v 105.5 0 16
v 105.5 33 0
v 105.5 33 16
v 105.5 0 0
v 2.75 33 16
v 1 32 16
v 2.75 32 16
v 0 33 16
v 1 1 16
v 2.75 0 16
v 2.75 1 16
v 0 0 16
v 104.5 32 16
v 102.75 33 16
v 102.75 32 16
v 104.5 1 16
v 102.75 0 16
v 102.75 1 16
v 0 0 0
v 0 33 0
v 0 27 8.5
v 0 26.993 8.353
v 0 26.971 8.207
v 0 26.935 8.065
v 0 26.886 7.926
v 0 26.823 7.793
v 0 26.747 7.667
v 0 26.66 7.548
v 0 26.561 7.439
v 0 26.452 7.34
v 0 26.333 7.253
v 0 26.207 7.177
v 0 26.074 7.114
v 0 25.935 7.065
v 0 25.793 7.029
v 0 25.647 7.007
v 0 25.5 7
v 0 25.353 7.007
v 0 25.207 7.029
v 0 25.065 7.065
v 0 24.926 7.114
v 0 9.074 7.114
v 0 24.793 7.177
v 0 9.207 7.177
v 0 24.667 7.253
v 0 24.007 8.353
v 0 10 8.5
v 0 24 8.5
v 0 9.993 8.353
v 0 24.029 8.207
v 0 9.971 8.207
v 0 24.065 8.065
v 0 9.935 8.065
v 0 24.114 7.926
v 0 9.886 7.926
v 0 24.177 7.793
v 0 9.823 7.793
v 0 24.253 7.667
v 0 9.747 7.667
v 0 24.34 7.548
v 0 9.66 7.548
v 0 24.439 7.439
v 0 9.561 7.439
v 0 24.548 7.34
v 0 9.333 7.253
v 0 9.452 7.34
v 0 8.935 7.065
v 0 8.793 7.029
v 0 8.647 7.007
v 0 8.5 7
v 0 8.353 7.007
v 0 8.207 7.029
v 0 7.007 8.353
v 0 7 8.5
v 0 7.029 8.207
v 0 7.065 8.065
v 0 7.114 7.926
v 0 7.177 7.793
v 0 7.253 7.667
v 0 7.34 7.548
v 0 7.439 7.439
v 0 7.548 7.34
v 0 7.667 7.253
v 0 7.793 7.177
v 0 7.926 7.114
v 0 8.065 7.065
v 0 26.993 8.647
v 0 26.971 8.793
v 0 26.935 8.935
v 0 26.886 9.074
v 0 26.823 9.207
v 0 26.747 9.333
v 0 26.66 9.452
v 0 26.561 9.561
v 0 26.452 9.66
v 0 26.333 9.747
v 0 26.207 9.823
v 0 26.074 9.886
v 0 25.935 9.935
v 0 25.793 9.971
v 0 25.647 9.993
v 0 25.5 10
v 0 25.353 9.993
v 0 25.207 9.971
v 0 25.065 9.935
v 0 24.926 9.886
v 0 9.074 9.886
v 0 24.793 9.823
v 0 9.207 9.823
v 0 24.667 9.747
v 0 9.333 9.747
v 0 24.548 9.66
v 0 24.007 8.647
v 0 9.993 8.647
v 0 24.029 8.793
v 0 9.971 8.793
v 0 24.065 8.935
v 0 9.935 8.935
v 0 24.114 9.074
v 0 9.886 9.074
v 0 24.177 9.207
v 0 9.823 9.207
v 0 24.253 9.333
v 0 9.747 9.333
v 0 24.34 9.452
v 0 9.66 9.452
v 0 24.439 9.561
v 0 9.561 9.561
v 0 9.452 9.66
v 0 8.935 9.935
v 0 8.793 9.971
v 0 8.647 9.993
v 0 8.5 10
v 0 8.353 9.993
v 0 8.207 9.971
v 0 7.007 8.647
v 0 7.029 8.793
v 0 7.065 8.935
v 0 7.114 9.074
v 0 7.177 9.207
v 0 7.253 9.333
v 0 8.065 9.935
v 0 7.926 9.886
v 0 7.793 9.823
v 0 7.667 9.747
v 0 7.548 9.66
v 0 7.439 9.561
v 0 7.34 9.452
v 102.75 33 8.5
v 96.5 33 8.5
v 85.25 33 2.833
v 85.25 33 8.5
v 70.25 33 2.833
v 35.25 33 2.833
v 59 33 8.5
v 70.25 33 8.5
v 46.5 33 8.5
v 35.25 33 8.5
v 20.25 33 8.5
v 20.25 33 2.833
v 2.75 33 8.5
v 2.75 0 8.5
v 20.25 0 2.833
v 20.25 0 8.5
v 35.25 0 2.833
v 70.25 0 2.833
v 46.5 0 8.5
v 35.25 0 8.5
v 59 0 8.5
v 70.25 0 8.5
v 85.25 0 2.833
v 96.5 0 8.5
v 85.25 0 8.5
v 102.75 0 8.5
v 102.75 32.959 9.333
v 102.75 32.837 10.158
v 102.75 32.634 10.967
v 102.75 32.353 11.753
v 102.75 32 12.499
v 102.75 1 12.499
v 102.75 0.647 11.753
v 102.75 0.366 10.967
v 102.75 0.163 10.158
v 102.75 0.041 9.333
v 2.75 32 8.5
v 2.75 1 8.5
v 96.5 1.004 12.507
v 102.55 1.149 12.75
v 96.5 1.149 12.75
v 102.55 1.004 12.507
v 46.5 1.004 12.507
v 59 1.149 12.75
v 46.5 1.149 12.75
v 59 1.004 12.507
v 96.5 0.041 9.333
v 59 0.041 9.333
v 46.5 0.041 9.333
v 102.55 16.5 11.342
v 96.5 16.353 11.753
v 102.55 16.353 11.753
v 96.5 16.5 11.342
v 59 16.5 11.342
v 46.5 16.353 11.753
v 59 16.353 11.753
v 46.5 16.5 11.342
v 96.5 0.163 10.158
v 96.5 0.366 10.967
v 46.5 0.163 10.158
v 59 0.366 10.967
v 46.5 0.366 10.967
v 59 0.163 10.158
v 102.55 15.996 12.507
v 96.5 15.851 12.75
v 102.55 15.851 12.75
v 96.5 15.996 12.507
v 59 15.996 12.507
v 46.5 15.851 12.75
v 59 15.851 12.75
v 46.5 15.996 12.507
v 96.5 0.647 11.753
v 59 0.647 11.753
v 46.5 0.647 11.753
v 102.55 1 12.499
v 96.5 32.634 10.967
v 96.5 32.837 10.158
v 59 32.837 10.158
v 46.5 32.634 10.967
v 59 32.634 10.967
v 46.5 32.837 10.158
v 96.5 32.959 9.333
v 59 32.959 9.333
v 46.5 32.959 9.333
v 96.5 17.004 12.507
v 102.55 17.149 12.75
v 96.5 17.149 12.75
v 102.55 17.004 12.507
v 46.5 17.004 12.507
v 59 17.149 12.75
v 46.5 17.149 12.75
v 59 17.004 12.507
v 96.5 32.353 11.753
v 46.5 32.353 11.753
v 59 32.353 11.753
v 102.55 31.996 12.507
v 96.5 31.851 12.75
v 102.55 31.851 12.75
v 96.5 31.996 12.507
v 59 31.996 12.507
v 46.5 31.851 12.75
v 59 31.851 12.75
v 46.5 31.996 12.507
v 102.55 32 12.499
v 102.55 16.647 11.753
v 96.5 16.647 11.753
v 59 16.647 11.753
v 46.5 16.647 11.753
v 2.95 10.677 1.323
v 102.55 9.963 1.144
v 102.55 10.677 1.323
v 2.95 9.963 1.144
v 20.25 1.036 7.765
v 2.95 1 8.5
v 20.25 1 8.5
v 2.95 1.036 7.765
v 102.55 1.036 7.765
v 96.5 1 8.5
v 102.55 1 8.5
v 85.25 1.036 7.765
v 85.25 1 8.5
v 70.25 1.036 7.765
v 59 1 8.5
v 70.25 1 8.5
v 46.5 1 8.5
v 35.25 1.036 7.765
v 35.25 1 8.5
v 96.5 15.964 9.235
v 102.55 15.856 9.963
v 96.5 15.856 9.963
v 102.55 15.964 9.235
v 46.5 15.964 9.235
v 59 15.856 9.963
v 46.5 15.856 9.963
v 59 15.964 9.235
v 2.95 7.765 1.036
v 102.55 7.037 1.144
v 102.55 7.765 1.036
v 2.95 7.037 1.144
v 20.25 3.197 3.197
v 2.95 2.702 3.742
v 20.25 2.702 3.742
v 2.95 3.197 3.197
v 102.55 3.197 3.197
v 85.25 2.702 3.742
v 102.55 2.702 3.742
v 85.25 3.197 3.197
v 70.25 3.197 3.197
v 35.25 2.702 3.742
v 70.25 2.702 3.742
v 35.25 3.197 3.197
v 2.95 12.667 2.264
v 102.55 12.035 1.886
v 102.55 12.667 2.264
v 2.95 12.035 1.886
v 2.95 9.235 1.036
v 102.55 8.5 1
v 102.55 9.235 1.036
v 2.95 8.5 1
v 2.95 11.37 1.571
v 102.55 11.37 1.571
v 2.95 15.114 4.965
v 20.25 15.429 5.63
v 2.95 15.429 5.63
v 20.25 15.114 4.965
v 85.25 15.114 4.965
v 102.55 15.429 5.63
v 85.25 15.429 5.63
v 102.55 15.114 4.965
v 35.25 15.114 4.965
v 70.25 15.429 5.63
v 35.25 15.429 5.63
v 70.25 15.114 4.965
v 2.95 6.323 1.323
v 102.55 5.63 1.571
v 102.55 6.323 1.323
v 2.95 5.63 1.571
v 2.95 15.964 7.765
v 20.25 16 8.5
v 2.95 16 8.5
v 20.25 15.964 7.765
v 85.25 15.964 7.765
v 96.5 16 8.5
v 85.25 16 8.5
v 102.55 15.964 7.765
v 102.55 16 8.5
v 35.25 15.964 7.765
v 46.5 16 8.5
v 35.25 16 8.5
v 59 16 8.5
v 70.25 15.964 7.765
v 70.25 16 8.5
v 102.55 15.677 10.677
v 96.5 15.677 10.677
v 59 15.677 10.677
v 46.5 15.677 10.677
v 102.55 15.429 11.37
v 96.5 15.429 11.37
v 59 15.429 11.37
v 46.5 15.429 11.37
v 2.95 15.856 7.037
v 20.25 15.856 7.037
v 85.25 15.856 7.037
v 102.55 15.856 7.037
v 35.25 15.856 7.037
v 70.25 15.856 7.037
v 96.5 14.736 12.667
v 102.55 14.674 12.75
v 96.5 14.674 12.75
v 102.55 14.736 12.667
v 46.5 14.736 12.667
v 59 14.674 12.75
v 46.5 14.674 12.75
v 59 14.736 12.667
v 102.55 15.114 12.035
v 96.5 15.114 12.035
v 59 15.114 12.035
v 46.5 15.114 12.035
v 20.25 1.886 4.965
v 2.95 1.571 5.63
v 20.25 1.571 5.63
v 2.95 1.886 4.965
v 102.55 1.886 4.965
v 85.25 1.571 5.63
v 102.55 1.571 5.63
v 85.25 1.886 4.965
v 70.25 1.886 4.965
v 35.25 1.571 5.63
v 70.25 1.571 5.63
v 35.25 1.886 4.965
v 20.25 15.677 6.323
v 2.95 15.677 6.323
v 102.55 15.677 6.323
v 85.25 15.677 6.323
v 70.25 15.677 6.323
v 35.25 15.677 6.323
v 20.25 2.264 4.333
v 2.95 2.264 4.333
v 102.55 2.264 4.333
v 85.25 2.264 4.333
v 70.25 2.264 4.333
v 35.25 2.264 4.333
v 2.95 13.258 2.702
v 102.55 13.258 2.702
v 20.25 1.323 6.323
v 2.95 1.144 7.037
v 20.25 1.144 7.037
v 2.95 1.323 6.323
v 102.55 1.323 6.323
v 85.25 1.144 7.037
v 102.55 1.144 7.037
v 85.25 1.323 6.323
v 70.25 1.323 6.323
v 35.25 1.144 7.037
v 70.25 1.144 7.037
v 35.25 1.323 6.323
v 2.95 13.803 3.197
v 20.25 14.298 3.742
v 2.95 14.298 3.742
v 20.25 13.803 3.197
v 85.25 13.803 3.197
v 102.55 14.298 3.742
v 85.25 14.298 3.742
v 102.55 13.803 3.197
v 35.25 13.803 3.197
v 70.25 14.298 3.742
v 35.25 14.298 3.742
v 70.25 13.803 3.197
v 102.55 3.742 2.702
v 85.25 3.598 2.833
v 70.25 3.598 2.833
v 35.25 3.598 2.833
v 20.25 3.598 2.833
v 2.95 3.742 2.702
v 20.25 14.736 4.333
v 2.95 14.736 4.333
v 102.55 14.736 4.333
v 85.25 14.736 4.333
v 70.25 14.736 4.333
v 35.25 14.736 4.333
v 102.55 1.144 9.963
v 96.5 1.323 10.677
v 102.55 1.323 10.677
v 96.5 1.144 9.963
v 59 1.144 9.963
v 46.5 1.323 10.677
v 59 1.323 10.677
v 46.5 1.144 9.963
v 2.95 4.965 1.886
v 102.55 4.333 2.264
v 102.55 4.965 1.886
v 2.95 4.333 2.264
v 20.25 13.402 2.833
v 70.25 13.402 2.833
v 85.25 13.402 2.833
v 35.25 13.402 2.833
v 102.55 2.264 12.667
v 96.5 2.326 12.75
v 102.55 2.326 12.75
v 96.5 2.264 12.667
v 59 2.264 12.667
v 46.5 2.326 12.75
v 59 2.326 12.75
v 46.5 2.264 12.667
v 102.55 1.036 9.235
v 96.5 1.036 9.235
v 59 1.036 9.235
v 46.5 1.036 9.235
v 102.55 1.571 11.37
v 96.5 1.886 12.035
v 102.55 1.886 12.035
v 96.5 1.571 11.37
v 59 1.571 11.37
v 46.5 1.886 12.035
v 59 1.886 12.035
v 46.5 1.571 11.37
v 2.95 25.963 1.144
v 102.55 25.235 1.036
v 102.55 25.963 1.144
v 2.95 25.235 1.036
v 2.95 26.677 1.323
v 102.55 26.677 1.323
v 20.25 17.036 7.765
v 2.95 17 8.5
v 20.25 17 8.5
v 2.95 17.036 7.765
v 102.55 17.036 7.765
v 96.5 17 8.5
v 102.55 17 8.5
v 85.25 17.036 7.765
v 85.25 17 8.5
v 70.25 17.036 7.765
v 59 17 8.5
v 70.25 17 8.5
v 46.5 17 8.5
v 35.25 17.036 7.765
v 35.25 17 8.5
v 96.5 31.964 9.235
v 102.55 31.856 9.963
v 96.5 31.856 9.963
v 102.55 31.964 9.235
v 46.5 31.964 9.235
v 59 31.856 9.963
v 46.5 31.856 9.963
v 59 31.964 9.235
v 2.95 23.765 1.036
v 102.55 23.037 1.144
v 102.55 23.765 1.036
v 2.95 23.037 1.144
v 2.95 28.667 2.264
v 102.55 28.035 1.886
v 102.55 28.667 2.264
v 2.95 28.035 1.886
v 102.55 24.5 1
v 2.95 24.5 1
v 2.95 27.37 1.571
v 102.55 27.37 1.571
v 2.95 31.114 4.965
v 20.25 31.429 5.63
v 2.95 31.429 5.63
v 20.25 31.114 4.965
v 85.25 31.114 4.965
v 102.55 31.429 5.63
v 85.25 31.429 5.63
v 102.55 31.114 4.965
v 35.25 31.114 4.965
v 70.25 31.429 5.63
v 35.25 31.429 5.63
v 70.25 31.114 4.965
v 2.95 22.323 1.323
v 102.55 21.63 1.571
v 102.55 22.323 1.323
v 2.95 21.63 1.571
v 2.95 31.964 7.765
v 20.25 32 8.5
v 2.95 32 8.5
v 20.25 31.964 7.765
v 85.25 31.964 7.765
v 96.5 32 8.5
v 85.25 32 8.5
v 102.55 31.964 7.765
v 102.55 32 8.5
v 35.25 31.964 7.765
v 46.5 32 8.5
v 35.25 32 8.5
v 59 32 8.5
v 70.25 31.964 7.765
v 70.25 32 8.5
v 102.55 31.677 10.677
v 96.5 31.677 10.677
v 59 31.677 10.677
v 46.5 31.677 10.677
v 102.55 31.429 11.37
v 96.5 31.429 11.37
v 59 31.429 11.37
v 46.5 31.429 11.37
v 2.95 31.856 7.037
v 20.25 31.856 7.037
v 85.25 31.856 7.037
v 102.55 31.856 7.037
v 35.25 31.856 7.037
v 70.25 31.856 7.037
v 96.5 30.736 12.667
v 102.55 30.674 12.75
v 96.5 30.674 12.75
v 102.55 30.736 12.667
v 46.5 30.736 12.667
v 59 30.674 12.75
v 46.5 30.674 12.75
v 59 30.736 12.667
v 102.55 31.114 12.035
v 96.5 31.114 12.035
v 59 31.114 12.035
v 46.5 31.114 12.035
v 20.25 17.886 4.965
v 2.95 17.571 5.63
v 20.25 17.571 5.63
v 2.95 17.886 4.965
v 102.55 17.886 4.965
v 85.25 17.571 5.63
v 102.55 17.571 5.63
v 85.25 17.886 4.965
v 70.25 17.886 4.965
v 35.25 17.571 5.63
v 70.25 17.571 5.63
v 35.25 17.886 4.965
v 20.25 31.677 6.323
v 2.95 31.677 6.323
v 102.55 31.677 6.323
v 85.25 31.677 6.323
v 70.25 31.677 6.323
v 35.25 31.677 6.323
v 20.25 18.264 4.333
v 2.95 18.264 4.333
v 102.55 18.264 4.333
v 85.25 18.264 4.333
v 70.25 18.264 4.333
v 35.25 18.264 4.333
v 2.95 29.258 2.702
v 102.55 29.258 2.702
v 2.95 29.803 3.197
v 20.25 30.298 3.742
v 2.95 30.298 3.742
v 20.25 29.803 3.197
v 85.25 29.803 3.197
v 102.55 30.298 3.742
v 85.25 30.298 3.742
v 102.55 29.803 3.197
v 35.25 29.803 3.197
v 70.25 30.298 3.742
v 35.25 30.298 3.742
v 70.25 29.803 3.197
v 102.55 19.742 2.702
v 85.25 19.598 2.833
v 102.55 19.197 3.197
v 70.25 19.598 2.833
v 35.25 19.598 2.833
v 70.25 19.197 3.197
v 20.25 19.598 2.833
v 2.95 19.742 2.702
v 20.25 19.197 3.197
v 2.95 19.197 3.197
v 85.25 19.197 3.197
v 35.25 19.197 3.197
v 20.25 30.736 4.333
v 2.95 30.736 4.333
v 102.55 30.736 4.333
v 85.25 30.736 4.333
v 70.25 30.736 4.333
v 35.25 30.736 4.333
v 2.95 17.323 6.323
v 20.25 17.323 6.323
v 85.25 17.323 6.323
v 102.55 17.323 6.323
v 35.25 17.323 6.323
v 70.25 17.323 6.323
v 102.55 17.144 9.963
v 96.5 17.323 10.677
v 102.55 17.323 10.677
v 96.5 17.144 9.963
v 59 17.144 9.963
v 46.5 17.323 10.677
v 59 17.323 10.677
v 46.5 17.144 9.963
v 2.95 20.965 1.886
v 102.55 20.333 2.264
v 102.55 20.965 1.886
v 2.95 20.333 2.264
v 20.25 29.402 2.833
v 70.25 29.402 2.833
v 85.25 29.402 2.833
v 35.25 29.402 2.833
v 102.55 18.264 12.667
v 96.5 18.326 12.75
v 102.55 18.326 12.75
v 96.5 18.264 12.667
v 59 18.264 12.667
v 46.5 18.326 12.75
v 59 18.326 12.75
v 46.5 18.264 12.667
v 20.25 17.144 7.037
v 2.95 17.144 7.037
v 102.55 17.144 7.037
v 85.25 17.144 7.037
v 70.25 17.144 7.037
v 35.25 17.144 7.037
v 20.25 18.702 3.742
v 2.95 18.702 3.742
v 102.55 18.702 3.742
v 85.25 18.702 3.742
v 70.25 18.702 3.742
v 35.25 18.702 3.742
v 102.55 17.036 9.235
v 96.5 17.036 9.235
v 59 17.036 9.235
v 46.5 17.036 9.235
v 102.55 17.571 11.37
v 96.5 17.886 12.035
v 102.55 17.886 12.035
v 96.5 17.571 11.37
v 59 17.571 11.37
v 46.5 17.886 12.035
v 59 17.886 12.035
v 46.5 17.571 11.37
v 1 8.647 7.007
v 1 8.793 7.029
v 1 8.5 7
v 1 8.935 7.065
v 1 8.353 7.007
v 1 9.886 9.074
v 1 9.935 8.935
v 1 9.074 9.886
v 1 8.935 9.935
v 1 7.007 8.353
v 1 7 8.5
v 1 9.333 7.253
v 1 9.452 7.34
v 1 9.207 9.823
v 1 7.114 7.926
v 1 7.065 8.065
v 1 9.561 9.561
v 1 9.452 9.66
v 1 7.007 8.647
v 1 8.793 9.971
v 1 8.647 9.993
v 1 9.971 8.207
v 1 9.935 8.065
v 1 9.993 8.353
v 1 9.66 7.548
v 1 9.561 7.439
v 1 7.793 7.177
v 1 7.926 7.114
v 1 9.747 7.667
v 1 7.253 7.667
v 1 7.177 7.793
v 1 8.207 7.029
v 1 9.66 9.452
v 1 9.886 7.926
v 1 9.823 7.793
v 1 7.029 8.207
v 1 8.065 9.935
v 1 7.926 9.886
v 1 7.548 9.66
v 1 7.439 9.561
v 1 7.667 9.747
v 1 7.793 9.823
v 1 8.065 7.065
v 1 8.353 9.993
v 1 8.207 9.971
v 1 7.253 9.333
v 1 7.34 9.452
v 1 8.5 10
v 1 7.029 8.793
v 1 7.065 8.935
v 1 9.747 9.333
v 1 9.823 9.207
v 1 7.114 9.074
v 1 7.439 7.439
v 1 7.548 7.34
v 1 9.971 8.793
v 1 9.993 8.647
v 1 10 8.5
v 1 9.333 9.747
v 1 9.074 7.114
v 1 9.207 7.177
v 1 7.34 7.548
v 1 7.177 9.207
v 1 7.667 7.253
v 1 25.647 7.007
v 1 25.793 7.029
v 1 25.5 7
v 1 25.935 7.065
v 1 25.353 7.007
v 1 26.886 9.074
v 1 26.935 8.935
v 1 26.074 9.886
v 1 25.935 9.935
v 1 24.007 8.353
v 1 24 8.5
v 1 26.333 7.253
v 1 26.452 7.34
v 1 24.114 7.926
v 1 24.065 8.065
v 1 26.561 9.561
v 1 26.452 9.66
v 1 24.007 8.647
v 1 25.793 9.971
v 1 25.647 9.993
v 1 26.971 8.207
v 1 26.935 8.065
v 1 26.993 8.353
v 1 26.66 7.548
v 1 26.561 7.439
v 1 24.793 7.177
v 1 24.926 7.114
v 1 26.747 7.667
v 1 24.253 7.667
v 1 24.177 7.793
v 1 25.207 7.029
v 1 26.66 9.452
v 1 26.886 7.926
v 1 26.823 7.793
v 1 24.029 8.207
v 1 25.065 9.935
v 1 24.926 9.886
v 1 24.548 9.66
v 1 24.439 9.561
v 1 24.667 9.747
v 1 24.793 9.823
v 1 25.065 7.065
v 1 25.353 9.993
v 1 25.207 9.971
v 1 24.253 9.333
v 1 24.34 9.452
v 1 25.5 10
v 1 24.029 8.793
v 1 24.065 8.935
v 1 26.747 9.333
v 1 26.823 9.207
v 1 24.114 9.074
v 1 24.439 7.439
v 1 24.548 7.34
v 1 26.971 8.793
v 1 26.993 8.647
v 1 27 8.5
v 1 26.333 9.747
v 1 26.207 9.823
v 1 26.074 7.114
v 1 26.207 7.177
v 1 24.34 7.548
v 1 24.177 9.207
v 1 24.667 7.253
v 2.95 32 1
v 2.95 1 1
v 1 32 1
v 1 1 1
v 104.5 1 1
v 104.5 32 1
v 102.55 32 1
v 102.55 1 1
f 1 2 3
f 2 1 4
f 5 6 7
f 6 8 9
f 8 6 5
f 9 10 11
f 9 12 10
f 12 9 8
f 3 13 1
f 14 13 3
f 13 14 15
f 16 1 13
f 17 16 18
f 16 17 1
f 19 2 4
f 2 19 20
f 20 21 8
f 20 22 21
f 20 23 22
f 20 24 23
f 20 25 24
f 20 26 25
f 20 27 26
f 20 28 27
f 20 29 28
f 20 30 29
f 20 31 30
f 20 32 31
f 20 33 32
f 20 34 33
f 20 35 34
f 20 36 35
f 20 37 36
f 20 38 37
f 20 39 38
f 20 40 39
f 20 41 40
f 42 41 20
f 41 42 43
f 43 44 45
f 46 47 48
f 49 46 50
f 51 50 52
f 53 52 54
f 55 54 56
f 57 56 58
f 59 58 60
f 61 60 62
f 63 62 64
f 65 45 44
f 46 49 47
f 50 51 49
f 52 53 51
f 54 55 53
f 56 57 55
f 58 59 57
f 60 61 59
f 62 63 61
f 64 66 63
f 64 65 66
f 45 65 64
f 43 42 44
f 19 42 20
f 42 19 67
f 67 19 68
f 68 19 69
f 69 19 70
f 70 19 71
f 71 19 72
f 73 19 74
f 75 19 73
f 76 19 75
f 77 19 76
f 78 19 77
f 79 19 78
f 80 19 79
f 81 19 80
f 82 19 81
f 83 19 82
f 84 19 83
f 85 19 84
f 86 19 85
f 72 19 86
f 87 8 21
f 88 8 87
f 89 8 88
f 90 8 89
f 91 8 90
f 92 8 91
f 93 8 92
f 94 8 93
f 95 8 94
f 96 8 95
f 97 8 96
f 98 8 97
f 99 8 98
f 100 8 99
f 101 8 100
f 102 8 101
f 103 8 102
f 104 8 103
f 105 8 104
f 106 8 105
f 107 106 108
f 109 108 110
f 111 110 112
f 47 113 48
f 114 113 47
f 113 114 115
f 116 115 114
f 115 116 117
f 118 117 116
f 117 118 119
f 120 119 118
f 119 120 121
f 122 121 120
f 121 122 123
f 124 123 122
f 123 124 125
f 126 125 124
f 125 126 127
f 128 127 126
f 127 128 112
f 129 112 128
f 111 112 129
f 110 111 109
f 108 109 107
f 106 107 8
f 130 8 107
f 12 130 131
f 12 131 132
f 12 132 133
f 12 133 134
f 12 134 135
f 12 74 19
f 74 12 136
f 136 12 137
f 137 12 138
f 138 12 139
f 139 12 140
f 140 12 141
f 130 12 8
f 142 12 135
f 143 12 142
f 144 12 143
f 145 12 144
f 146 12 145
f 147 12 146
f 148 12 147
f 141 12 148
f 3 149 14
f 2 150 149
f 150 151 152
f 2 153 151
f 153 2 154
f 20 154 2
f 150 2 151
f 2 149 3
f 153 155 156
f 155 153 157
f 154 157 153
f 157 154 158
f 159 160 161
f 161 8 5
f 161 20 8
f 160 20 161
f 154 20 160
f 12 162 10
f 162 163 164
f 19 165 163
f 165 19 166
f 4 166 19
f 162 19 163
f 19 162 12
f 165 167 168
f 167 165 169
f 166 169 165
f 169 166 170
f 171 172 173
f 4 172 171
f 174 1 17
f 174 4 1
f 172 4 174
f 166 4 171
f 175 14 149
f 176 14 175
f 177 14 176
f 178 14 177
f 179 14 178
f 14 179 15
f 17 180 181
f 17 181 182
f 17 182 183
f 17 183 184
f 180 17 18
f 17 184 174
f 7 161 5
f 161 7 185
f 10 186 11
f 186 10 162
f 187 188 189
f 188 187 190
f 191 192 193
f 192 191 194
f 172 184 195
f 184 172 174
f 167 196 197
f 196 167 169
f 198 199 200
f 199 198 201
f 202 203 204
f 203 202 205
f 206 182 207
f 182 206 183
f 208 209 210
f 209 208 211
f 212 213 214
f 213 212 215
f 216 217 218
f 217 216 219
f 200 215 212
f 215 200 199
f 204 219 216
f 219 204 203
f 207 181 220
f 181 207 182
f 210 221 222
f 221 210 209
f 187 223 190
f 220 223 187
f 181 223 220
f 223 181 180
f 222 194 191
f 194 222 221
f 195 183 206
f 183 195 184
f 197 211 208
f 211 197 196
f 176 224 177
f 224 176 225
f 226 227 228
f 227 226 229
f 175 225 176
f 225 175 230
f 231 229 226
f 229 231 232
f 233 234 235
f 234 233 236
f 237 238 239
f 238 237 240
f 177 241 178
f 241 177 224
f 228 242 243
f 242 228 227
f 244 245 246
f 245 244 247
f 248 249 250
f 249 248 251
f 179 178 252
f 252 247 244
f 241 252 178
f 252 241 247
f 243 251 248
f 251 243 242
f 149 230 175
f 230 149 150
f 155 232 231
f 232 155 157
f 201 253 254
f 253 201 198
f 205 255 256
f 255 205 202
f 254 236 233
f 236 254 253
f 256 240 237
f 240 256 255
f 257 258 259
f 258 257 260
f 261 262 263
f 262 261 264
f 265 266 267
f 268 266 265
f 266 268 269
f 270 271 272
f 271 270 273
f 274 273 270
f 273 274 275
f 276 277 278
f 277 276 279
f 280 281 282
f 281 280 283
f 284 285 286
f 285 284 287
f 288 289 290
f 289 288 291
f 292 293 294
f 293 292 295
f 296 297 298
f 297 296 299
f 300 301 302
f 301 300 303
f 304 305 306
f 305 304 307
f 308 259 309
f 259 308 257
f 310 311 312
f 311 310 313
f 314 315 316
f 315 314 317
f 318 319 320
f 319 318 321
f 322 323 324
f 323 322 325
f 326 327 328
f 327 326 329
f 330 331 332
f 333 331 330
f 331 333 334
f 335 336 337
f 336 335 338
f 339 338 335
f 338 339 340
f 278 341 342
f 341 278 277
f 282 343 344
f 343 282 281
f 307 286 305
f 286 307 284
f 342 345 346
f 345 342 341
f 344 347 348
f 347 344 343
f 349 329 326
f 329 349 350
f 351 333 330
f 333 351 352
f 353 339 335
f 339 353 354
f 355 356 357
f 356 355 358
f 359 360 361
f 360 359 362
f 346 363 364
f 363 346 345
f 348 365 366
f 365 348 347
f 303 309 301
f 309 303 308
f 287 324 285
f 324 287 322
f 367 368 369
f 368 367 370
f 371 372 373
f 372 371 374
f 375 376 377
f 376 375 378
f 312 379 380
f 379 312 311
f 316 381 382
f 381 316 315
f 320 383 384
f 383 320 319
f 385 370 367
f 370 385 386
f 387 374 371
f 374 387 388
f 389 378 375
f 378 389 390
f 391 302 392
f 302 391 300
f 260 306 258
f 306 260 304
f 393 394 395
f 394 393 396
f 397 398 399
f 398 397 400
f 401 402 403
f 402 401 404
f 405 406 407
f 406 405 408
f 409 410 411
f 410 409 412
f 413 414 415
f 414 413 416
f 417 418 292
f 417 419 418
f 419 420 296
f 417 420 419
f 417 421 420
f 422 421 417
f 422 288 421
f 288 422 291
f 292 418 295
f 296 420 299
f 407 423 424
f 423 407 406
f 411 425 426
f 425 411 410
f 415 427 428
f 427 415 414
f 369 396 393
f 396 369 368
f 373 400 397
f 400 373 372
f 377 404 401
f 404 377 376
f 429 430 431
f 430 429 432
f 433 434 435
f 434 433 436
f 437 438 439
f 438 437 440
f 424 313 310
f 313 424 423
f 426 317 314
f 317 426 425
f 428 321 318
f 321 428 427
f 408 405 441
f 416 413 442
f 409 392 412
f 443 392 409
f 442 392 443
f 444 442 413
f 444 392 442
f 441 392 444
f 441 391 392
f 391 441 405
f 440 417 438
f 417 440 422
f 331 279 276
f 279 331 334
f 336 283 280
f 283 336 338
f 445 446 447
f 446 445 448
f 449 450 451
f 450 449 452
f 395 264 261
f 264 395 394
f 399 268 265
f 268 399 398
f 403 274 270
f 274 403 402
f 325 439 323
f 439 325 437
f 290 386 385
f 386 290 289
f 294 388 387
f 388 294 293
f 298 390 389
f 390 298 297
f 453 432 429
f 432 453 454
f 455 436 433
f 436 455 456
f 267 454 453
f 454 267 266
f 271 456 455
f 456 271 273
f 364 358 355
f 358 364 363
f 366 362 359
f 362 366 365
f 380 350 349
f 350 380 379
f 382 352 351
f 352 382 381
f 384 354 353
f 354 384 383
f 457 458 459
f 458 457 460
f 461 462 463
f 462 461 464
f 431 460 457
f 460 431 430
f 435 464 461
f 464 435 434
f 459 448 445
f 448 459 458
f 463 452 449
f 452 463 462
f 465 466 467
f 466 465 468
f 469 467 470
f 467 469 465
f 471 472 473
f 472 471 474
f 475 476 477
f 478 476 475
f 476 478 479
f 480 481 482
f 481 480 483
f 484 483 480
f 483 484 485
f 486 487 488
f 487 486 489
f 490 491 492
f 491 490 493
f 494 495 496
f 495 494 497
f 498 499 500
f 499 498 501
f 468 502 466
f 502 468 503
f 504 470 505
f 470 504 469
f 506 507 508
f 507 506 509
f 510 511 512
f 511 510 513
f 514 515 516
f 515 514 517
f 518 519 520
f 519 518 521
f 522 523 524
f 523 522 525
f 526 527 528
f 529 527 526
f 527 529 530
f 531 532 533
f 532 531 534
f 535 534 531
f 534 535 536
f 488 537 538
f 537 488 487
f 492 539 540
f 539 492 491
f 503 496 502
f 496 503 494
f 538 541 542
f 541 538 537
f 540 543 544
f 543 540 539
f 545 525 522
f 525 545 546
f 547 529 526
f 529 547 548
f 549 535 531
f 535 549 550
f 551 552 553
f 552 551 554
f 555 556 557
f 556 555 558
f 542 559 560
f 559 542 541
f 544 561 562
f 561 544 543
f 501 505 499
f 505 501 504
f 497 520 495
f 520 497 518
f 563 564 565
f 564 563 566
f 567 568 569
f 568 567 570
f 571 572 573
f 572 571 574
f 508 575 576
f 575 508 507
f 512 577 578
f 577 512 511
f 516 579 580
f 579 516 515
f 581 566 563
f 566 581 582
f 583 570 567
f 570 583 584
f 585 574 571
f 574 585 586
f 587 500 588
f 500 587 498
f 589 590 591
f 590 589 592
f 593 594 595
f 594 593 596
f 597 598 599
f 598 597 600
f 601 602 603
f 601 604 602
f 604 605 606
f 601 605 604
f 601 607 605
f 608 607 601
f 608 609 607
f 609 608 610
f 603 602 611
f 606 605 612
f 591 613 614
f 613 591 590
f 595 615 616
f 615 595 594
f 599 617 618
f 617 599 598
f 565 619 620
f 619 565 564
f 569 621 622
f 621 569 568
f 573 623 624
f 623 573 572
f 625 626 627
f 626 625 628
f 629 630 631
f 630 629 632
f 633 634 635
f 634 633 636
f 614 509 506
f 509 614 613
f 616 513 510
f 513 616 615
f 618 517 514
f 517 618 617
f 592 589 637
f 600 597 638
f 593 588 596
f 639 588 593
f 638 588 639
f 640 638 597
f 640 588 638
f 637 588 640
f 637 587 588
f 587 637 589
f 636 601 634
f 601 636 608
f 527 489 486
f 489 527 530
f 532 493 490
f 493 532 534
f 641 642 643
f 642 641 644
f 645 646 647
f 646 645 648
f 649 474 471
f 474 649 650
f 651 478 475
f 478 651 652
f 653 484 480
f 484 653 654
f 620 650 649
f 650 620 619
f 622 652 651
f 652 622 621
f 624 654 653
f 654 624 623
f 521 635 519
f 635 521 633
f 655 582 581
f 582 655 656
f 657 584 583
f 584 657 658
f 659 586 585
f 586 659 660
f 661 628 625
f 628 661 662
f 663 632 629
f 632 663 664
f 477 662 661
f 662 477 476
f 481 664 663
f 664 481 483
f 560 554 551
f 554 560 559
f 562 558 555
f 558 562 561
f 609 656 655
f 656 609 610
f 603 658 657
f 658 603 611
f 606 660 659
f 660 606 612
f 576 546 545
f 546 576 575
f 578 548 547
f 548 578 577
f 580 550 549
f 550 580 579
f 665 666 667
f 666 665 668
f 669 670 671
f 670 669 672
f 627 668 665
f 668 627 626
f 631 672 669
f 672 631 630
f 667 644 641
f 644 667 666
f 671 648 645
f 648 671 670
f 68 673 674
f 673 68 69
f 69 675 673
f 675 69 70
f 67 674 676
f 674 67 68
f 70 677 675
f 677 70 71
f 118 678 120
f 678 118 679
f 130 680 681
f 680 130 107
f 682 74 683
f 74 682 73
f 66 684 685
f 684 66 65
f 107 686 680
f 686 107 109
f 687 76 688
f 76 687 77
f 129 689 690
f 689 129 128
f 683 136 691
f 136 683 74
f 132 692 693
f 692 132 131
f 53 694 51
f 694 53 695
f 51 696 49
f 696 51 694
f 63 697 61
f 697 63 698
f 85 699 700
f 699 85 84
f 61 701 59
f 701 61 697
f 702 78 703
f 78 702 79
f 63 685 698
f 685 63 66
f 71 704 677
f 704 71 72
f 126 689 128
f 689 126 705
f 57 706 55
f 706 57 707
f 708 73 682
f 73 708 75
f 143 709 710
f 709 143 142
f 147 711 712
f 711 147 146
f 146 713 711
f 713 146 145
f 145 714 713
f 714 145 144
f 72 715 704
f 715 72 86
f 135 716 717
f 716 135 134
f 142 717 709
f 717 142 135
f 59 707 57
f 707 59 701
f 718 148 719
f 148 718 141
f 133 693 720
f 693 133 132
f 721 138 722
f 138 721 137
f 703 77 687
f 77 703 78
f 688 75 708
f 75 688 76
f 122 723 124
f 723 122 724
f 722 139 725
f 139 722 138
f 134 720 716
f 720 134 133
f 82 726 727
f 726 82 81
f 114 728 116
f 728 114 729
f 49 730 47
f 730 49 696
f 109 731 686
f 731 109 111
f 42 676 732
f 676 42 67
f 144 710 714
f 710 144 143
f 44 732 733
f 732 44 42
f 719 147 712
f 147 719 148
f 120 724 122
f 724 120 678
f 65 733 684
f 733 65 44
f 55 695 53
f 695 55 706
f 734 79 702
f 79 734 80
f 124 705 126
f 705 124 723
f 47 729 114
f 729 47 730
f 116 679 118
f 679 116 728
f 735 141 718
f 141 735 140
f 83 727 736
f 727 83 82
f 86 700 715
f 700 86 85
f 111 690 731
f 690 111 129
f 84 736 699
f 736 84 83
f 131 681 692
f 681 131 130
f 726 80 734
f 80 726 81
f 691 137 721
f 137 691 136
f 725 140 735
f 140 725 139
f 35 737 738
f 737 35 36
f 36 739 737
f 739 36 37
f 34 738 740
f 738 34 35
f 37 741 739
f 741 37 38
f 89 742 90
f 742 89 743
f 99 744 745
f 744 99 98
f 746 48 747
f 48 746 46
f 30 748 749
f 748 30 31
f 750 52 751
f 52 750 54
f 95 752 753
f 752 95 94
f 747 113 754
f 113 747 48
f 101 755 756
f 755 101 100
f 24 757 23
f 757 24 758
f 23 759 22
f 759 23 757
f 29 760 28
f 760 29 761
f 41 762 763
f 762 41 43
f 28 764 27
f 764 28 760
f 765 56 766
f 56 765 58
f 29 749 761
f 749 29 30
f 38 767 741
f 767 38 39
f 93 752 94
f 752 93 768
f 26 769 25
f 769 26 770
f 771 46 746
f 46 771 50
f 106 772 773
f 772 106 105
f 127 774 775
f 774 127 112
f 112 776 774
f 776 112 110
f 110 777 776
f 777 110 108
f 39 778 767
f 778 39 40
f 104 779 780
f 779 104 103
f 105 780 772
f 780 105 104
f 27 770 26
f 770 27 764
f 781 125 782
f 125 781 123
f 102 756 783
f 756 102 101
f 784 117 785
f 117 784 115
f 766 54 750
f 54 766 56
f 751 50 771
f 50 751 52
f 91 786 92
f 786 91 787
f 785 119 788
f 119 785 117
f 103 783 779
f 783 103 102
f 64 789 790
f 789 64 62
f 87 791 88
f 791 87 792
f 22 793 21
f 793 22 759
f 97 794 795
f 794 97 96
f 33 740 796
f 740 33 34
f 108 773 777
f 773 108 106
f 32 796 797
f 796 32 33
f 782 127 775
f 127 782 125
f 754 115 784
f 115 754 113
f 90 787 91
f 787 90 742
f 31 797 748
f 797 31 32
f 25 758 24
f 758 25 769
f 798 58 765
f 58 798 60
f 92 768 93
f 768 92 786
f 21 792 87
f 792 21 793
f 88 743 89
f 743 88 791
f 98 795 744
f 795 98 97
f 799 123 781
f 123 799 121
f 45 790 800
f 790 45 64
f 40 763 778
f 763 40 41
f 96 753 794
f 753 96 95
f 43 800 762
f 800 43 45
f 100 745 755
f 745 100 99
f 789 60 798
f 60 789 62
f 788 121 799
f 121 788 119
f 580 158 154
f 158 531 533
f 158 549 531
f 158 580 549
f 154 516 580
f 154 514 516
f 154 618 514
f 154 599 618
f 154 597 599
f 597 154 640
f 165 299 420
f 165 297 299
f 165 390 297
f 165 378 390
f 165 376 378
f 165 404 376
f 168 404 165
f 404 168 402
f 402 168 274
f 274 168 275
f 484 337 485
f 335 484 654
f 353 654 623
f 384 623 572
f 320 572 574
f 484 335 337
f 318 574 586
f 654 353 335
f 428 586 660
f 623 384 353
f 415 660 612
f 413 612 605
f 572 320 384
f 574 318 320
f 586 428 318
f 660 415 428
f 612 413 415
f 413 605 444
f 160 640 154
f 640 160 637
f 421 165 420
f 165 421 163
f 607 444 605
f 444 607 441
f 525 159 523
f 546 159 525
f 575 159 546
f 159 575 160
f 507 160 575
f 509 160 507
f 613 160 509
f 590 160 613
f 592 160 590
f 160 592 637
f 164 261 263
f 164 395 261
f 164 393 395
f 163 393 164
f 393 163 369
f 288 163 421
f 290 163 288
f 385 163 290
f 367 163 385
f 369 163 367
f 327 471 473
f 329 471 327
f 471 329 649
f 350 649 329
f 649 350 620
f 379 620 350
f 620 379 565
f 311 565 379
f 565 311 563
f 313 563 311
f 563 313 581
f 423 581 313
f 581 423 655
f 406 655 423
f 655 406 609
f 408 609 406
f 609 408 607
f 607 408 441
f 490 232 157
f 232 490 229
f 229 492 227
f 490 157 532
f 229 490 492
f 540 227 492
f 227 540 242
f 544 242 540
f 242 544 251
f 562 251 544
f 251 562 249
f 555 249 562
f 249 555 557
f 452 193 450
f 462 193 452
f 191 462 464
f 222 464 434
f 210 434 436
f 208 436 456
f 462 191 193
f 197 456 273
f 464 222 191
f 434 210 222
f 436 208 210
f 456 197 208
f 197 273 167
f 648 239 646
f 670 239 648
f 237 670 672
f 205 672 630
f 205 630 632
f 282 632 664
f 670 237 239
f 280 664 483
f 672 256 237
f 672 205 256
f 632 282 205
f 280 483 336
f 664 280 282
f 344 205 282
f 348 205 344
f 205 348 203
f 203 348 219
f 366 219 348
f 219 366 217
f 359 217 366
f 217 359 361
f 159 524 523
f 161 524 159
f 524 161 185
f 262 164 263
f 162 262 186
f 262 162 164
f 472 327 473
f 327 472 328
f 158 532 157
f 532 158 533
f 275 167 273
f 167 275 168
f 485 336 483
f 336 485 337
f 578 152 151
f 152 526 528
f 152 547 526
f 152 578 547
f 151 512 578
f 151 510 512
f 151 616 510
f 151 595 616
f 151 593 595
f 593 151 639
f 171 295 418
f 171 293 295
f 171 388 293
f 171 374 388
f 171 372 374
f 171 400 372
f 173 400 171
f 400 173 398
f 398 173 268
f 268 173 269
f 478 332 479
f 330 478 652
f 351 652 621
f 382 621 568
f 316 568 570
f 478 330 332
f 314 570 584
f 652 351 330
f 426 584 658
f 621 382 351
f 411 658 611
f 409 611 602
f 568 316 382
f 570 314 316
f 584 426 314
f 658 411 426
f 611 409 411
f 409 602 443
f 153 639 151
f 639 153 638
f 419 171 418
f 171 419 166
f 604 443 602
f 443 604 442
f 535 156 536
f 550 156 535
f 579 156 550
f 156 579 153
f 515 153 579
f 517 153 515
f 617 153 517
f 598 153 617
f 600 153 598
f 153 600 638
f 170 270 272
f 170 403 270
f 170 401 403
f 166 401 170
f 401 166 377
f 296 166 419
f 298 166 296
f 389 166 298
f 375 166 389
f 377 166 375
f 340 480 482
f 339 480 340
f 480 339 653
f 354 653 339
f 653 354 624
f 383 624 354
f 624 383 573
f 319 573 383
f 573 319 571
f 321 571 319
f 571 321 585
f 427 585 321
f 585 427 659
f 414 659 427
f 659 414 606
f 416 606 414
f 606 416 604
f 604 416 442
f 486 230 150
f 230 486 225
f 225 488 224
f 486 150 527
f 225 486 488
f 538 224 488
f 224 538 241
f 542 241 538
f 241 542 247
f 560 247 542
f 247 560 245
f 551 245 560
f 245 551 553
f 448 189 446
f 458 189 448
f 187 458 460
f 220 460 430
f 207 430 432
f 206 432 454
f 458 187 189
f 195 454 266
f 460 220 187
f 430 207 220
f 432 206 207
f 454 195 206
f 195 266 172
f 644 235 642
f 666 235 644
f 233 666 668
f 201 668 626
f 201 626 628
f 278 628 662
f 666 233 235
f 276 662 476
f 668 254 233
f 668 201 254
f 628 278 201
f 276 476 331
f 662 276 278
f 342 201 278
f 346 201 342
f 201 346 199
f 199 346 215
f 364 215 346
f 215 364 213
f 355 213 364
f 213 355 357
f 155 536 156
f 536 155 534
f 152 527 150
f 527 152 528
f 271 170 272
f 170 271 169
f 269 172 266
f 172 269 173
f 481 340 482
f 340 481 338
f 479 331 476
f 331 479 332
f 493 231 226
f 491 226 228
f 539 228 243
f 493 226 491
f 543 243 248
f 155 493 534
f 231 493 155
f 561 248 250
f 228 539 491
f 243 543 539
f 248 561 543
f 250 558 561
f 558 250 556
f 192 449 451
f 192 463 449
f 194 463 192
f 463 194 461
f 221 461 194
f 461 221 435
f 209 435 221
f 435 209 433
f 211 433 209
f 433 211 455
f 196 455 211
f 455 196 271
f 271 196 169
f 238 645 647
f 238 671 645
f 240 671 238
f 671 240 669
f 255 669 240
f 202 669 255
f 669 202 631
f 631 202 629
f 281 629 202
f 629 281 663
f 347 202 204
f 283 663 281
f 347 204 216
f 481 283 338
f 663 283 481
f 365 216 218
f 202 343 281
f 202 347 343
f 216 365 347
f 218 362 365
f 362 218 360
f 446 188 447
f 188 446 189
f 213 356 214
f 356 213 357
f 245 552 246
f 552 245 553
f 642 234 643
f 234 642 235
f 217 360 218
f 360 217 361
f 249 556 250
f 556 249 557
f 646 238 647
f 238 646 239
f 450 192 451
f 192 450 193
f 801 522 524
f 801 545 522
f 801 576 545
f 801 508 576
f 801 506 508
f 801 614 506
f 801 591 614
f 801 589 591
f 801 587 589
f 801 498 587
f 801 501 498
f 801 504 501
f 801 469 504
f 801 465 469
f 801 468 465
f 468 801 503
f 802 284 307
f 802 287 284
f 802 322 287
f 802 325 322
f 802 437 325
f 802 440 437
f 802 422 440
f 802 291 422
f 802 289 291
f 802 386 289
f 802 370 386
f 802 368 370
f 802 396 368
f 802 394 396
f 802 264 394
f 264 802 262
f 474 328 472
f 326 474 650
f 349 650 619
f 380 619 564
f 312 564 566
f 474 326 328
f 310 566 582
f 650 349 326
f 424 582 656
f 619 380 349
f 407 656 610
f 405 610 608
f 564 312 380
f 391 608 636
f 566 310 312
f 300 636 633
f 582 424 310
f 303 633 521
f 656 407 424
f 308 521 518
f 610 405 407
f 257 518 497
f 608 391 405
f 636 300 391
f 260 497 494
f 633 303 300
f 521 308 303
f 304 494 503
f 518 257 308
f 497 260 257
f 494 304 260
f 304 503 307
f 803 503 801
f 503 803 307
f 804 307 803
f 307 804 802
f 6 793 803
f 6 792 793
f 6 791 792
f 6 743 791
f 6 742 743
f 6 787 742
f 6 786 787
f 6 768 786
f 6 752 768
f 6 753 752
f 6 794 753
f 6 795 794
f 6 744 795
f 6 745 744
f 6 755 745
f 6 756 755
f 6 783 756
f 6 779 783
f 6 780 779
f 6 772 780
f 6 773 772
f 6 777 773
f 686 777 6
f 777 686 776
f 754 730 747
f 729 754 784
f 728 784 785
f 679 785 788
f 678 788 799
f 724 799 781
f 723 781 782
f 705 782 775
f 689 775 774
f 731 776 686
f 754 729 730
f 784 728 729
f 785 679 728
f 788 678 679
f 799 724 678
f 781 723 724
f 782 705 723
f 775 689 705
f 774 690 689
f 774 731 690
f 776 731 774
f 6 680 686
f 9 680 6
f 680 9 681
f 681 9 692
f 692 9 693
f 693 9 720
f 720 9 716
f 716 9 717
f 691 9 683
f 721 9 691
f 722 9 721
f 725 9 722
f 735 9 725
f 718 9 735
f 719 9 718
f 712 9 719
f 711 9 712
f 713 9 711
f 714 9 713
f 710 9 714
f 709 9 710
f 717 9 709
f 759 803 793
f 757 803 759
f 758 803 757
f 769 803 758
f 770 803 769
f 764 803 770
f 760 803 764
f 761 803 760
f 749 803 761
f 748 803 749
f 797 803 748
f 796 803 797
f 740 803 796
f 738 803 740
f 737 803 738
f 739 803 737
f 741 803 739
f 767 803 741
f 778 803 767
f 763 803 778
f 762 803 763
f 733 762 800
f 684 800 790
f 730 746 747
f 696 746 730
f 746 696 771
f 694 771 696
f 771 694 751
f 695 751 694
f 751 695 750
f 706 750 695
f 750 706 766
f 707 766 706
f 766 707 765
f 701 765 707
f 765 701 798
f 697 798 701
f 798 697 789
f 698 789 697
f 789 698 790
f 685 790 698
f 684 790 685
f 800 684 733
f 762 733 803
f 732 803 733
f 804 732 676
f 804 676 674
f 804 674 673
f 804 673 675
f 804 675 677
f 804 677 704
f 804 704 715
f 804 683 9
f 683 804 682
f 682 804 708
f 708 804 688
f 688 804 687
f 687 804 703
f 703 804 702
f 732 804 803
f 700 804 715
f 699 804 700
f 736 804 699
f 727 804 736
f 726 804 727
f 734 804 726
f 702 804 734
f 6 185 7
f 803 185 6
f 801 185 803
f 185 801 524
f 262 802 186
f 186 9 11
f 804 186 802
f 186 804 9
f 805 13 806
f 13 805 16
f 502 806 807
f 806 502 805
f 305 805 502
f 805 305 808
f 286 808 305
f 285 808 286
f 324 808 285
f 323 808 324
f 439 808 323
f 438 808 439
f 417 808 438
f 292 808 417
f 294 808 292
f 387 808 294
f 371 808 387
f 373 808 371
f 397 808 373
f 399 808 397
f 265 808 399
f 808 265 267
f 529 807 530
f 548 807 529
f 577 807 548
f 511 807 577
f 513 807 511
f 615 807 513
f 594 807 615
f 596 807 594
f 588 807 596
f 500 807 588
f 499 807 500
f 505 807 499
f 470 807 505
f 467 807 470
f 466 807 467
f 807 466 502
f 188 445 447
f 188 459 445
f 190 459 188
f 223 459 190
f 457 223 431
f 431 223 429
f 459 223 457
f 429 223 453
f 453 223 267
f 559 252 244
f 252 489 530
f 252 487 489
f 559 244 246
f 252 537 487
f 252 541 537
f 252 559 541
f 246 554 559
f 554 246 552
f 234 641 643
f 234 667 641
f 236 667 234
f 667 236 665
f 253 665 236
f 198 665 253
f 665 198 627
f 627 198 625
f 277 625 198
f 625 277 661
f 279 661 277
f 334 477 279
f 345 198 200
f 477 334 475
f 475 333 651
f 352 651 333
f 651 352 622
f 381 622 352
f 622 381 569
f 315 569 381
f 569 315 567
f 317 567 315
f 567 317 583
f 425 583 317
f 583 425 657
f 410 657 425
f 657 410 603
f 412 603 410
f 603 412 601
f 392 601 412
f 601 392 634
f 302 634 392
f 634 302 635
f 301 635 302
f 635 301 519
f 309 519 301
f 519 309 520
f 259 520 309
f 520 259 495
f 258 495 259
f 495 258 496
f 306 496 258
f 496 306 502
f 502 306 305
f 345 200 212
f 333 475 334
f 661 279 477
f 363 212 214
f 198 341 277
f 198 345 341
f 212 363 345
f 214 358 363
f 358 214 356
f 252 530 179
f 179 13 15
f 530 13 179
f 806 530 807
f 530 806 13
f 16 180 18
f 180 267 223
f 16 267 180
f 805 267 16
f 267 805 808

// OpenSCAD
/* [General] */
// Amount of battery rows
rows = 2; // [1:10]
// Amount of battery columns
columns = 2; // [1:10]

// Diameter of the battery
batteryDiameter = 15;
// Length of the battery
batteryLength = 50;

// With of the cutout to help removing the battery
batteryHolderPullWidth = 15;

// Bottom Height
batteryHolderBottom = 1;
// Wall thickness
batteryHolderWalls = 1;

/* [Connector] */
// Thickness of the battery tabs
batteryConnectorThickness = 1.75;
// Diameter of the holes for power cables
batteryHolderHoleDiameter = 3;

/* [Hidden] */
$fn = 64;

spacing = 0.2;
batteryRadius = batteryDiameter / 2;
batteryHolderHeight = batteryHolderBottom + batteryRadius;
batteryHolderHeightOuter = batteryHolderBottom + batteryDiameter;
batteryHolderLength = (batteryLength * columns) + (batteryHolderWalls + batteryConnectorThickness) * 2;
batteryHolderLengthInner = (batteryLength) * columns;

batteryXOffset = batteryHolderWalls + batteryConnectorThickness;
batteryPullOffset = batteryLength / 2 - batteryHolderPullWidth / 2;
batteryHolderWidth = (batteryDiameter + batteryHolderWalls) * rows + batteryHolderWalls;

batteryHolderHoleRadius = batteryHolderHoleDiameter / 2;

batteryHolder();

module batteryHolder() {
  difference() {
    group() {
      difference() {
        cube([batteryHolderLength, batteryHolderWidth, batteryHolderHeightOuter]);
        translate([batteryHolderWalls + batteryConnectorThickness, -1, batteryHolderHeight]) {
          cube([batteryHolderLengthInner, batteryDiameter * rows + batteryHolderWalls * (rows + 1) + 2, batteryHolderHeight + 1]);
      }
      }
      
      for(i=[1:1:rows]) {
        rotate([0, 90, 0])
          translate([-batteryRadius - batteryHolderBottom, batteryRadius + batteryHolderWalls + (batteryDiameter + batteryHolderWalls) * (i - 1), 0])
            cylinder(h=batteryLength * columns + (batteryHolderWalls + batteryConnectorThickness) * 2, r =batteryRadius + batteryHolderWalls);
      }
    }
    
    translate([-1,-1,batteryHolderHeightOuter])
      cube([batteryHolderLength + 2, batteryHolderWidth + 2, batteryHolderHeightOuter]);

    for(i=[1:1:rows]) {
      rotate([0, 90, 0]) {
        translate([-batteryRadius - batteryHolderBottom, (batteryRadius + batteryHolderWalls) + (batteryDiameter + batteryHolderWalls) * (i - 1), batteryHolderWalls + batteryConnectorThickness])
          cylinder(h=batteryLength * columns, r =batteryRadius);
      }
    }
    
    translate([batteryHolderWalls + batteryConnectorThickness, -1, batteryHolderHeight * 1.5]) {
      cube([batteryHolderLengthInner, (batteryDiameter + batteryHolderWalls) * rows + batteryHolderWalls + 2, batteryHolderHeight + 1]);
    }
    
    rotate([0, 90, 0]) {
      translate([-batteryRadius - batteryHolderBottom, batteryRadius + batteryHolderWalls, -1]) {
        cylinder(h=batteryHolderWalls + 2, r=batteryHolderHoleRadius);
      }
      translate([-batteryRadius - batteryHolderBottom, batteryRadius + batteryHolderWalls * 2 + (batteryDiameter + batteryHolderWalls) * (rows - 1), -1]) {
        cylinder(h=batteryHolderWalls + 2, r=batteryHolderHoleRadius);
      }
    }
    
    translate([batteryHolderWalls, batteryHolderWalls, batteryHolderBottom])
      cube([batteryConnectorThickness + spacing, (batteryDiameter + batteryHolderWalls) * rows - batteryHolderWalls, batteryHolderBottom + batteryDiameter + 1]);
    
    translate([batteryHolderWalls + batteryConnectorThickness + batteryLength * columns - spacing, batteryHolderWalls, batteryHolderBottom])
      cube([batteryConnectorThickness + spacing,  (batteryDiameter + batteryHolderWalls) * rows - batteryHolderWalls, batteryHolderBottom + batteryDiameter + 1]);
    
    for(i=[1:1:columns]) {
      translate([batteryXOffset + batteryPullOffset + (batteryLength * (i - 1)), -1, batteryHolderHeight / 3])
        cube([batteryHolderPullWidth, batteryHolderWidth + 2, batteryHolderHeight * 2]);
      
      translate([batteryXOffset + batteryLength / 8 + (batteryLength * (i - 1)), -1, batteryHolderHeight])
        cube([batteryLength / 8 * 6, batteryHolderWidth + 2, batteryHolderHeight * 2]);
    }

    translate([batteryXOffset, -1, batteryHolderHeight])
        cube([batteryLength / 8 * 6, batteryHolderWidth + 2, batteryHolderHeight * 2]);
  }
}
